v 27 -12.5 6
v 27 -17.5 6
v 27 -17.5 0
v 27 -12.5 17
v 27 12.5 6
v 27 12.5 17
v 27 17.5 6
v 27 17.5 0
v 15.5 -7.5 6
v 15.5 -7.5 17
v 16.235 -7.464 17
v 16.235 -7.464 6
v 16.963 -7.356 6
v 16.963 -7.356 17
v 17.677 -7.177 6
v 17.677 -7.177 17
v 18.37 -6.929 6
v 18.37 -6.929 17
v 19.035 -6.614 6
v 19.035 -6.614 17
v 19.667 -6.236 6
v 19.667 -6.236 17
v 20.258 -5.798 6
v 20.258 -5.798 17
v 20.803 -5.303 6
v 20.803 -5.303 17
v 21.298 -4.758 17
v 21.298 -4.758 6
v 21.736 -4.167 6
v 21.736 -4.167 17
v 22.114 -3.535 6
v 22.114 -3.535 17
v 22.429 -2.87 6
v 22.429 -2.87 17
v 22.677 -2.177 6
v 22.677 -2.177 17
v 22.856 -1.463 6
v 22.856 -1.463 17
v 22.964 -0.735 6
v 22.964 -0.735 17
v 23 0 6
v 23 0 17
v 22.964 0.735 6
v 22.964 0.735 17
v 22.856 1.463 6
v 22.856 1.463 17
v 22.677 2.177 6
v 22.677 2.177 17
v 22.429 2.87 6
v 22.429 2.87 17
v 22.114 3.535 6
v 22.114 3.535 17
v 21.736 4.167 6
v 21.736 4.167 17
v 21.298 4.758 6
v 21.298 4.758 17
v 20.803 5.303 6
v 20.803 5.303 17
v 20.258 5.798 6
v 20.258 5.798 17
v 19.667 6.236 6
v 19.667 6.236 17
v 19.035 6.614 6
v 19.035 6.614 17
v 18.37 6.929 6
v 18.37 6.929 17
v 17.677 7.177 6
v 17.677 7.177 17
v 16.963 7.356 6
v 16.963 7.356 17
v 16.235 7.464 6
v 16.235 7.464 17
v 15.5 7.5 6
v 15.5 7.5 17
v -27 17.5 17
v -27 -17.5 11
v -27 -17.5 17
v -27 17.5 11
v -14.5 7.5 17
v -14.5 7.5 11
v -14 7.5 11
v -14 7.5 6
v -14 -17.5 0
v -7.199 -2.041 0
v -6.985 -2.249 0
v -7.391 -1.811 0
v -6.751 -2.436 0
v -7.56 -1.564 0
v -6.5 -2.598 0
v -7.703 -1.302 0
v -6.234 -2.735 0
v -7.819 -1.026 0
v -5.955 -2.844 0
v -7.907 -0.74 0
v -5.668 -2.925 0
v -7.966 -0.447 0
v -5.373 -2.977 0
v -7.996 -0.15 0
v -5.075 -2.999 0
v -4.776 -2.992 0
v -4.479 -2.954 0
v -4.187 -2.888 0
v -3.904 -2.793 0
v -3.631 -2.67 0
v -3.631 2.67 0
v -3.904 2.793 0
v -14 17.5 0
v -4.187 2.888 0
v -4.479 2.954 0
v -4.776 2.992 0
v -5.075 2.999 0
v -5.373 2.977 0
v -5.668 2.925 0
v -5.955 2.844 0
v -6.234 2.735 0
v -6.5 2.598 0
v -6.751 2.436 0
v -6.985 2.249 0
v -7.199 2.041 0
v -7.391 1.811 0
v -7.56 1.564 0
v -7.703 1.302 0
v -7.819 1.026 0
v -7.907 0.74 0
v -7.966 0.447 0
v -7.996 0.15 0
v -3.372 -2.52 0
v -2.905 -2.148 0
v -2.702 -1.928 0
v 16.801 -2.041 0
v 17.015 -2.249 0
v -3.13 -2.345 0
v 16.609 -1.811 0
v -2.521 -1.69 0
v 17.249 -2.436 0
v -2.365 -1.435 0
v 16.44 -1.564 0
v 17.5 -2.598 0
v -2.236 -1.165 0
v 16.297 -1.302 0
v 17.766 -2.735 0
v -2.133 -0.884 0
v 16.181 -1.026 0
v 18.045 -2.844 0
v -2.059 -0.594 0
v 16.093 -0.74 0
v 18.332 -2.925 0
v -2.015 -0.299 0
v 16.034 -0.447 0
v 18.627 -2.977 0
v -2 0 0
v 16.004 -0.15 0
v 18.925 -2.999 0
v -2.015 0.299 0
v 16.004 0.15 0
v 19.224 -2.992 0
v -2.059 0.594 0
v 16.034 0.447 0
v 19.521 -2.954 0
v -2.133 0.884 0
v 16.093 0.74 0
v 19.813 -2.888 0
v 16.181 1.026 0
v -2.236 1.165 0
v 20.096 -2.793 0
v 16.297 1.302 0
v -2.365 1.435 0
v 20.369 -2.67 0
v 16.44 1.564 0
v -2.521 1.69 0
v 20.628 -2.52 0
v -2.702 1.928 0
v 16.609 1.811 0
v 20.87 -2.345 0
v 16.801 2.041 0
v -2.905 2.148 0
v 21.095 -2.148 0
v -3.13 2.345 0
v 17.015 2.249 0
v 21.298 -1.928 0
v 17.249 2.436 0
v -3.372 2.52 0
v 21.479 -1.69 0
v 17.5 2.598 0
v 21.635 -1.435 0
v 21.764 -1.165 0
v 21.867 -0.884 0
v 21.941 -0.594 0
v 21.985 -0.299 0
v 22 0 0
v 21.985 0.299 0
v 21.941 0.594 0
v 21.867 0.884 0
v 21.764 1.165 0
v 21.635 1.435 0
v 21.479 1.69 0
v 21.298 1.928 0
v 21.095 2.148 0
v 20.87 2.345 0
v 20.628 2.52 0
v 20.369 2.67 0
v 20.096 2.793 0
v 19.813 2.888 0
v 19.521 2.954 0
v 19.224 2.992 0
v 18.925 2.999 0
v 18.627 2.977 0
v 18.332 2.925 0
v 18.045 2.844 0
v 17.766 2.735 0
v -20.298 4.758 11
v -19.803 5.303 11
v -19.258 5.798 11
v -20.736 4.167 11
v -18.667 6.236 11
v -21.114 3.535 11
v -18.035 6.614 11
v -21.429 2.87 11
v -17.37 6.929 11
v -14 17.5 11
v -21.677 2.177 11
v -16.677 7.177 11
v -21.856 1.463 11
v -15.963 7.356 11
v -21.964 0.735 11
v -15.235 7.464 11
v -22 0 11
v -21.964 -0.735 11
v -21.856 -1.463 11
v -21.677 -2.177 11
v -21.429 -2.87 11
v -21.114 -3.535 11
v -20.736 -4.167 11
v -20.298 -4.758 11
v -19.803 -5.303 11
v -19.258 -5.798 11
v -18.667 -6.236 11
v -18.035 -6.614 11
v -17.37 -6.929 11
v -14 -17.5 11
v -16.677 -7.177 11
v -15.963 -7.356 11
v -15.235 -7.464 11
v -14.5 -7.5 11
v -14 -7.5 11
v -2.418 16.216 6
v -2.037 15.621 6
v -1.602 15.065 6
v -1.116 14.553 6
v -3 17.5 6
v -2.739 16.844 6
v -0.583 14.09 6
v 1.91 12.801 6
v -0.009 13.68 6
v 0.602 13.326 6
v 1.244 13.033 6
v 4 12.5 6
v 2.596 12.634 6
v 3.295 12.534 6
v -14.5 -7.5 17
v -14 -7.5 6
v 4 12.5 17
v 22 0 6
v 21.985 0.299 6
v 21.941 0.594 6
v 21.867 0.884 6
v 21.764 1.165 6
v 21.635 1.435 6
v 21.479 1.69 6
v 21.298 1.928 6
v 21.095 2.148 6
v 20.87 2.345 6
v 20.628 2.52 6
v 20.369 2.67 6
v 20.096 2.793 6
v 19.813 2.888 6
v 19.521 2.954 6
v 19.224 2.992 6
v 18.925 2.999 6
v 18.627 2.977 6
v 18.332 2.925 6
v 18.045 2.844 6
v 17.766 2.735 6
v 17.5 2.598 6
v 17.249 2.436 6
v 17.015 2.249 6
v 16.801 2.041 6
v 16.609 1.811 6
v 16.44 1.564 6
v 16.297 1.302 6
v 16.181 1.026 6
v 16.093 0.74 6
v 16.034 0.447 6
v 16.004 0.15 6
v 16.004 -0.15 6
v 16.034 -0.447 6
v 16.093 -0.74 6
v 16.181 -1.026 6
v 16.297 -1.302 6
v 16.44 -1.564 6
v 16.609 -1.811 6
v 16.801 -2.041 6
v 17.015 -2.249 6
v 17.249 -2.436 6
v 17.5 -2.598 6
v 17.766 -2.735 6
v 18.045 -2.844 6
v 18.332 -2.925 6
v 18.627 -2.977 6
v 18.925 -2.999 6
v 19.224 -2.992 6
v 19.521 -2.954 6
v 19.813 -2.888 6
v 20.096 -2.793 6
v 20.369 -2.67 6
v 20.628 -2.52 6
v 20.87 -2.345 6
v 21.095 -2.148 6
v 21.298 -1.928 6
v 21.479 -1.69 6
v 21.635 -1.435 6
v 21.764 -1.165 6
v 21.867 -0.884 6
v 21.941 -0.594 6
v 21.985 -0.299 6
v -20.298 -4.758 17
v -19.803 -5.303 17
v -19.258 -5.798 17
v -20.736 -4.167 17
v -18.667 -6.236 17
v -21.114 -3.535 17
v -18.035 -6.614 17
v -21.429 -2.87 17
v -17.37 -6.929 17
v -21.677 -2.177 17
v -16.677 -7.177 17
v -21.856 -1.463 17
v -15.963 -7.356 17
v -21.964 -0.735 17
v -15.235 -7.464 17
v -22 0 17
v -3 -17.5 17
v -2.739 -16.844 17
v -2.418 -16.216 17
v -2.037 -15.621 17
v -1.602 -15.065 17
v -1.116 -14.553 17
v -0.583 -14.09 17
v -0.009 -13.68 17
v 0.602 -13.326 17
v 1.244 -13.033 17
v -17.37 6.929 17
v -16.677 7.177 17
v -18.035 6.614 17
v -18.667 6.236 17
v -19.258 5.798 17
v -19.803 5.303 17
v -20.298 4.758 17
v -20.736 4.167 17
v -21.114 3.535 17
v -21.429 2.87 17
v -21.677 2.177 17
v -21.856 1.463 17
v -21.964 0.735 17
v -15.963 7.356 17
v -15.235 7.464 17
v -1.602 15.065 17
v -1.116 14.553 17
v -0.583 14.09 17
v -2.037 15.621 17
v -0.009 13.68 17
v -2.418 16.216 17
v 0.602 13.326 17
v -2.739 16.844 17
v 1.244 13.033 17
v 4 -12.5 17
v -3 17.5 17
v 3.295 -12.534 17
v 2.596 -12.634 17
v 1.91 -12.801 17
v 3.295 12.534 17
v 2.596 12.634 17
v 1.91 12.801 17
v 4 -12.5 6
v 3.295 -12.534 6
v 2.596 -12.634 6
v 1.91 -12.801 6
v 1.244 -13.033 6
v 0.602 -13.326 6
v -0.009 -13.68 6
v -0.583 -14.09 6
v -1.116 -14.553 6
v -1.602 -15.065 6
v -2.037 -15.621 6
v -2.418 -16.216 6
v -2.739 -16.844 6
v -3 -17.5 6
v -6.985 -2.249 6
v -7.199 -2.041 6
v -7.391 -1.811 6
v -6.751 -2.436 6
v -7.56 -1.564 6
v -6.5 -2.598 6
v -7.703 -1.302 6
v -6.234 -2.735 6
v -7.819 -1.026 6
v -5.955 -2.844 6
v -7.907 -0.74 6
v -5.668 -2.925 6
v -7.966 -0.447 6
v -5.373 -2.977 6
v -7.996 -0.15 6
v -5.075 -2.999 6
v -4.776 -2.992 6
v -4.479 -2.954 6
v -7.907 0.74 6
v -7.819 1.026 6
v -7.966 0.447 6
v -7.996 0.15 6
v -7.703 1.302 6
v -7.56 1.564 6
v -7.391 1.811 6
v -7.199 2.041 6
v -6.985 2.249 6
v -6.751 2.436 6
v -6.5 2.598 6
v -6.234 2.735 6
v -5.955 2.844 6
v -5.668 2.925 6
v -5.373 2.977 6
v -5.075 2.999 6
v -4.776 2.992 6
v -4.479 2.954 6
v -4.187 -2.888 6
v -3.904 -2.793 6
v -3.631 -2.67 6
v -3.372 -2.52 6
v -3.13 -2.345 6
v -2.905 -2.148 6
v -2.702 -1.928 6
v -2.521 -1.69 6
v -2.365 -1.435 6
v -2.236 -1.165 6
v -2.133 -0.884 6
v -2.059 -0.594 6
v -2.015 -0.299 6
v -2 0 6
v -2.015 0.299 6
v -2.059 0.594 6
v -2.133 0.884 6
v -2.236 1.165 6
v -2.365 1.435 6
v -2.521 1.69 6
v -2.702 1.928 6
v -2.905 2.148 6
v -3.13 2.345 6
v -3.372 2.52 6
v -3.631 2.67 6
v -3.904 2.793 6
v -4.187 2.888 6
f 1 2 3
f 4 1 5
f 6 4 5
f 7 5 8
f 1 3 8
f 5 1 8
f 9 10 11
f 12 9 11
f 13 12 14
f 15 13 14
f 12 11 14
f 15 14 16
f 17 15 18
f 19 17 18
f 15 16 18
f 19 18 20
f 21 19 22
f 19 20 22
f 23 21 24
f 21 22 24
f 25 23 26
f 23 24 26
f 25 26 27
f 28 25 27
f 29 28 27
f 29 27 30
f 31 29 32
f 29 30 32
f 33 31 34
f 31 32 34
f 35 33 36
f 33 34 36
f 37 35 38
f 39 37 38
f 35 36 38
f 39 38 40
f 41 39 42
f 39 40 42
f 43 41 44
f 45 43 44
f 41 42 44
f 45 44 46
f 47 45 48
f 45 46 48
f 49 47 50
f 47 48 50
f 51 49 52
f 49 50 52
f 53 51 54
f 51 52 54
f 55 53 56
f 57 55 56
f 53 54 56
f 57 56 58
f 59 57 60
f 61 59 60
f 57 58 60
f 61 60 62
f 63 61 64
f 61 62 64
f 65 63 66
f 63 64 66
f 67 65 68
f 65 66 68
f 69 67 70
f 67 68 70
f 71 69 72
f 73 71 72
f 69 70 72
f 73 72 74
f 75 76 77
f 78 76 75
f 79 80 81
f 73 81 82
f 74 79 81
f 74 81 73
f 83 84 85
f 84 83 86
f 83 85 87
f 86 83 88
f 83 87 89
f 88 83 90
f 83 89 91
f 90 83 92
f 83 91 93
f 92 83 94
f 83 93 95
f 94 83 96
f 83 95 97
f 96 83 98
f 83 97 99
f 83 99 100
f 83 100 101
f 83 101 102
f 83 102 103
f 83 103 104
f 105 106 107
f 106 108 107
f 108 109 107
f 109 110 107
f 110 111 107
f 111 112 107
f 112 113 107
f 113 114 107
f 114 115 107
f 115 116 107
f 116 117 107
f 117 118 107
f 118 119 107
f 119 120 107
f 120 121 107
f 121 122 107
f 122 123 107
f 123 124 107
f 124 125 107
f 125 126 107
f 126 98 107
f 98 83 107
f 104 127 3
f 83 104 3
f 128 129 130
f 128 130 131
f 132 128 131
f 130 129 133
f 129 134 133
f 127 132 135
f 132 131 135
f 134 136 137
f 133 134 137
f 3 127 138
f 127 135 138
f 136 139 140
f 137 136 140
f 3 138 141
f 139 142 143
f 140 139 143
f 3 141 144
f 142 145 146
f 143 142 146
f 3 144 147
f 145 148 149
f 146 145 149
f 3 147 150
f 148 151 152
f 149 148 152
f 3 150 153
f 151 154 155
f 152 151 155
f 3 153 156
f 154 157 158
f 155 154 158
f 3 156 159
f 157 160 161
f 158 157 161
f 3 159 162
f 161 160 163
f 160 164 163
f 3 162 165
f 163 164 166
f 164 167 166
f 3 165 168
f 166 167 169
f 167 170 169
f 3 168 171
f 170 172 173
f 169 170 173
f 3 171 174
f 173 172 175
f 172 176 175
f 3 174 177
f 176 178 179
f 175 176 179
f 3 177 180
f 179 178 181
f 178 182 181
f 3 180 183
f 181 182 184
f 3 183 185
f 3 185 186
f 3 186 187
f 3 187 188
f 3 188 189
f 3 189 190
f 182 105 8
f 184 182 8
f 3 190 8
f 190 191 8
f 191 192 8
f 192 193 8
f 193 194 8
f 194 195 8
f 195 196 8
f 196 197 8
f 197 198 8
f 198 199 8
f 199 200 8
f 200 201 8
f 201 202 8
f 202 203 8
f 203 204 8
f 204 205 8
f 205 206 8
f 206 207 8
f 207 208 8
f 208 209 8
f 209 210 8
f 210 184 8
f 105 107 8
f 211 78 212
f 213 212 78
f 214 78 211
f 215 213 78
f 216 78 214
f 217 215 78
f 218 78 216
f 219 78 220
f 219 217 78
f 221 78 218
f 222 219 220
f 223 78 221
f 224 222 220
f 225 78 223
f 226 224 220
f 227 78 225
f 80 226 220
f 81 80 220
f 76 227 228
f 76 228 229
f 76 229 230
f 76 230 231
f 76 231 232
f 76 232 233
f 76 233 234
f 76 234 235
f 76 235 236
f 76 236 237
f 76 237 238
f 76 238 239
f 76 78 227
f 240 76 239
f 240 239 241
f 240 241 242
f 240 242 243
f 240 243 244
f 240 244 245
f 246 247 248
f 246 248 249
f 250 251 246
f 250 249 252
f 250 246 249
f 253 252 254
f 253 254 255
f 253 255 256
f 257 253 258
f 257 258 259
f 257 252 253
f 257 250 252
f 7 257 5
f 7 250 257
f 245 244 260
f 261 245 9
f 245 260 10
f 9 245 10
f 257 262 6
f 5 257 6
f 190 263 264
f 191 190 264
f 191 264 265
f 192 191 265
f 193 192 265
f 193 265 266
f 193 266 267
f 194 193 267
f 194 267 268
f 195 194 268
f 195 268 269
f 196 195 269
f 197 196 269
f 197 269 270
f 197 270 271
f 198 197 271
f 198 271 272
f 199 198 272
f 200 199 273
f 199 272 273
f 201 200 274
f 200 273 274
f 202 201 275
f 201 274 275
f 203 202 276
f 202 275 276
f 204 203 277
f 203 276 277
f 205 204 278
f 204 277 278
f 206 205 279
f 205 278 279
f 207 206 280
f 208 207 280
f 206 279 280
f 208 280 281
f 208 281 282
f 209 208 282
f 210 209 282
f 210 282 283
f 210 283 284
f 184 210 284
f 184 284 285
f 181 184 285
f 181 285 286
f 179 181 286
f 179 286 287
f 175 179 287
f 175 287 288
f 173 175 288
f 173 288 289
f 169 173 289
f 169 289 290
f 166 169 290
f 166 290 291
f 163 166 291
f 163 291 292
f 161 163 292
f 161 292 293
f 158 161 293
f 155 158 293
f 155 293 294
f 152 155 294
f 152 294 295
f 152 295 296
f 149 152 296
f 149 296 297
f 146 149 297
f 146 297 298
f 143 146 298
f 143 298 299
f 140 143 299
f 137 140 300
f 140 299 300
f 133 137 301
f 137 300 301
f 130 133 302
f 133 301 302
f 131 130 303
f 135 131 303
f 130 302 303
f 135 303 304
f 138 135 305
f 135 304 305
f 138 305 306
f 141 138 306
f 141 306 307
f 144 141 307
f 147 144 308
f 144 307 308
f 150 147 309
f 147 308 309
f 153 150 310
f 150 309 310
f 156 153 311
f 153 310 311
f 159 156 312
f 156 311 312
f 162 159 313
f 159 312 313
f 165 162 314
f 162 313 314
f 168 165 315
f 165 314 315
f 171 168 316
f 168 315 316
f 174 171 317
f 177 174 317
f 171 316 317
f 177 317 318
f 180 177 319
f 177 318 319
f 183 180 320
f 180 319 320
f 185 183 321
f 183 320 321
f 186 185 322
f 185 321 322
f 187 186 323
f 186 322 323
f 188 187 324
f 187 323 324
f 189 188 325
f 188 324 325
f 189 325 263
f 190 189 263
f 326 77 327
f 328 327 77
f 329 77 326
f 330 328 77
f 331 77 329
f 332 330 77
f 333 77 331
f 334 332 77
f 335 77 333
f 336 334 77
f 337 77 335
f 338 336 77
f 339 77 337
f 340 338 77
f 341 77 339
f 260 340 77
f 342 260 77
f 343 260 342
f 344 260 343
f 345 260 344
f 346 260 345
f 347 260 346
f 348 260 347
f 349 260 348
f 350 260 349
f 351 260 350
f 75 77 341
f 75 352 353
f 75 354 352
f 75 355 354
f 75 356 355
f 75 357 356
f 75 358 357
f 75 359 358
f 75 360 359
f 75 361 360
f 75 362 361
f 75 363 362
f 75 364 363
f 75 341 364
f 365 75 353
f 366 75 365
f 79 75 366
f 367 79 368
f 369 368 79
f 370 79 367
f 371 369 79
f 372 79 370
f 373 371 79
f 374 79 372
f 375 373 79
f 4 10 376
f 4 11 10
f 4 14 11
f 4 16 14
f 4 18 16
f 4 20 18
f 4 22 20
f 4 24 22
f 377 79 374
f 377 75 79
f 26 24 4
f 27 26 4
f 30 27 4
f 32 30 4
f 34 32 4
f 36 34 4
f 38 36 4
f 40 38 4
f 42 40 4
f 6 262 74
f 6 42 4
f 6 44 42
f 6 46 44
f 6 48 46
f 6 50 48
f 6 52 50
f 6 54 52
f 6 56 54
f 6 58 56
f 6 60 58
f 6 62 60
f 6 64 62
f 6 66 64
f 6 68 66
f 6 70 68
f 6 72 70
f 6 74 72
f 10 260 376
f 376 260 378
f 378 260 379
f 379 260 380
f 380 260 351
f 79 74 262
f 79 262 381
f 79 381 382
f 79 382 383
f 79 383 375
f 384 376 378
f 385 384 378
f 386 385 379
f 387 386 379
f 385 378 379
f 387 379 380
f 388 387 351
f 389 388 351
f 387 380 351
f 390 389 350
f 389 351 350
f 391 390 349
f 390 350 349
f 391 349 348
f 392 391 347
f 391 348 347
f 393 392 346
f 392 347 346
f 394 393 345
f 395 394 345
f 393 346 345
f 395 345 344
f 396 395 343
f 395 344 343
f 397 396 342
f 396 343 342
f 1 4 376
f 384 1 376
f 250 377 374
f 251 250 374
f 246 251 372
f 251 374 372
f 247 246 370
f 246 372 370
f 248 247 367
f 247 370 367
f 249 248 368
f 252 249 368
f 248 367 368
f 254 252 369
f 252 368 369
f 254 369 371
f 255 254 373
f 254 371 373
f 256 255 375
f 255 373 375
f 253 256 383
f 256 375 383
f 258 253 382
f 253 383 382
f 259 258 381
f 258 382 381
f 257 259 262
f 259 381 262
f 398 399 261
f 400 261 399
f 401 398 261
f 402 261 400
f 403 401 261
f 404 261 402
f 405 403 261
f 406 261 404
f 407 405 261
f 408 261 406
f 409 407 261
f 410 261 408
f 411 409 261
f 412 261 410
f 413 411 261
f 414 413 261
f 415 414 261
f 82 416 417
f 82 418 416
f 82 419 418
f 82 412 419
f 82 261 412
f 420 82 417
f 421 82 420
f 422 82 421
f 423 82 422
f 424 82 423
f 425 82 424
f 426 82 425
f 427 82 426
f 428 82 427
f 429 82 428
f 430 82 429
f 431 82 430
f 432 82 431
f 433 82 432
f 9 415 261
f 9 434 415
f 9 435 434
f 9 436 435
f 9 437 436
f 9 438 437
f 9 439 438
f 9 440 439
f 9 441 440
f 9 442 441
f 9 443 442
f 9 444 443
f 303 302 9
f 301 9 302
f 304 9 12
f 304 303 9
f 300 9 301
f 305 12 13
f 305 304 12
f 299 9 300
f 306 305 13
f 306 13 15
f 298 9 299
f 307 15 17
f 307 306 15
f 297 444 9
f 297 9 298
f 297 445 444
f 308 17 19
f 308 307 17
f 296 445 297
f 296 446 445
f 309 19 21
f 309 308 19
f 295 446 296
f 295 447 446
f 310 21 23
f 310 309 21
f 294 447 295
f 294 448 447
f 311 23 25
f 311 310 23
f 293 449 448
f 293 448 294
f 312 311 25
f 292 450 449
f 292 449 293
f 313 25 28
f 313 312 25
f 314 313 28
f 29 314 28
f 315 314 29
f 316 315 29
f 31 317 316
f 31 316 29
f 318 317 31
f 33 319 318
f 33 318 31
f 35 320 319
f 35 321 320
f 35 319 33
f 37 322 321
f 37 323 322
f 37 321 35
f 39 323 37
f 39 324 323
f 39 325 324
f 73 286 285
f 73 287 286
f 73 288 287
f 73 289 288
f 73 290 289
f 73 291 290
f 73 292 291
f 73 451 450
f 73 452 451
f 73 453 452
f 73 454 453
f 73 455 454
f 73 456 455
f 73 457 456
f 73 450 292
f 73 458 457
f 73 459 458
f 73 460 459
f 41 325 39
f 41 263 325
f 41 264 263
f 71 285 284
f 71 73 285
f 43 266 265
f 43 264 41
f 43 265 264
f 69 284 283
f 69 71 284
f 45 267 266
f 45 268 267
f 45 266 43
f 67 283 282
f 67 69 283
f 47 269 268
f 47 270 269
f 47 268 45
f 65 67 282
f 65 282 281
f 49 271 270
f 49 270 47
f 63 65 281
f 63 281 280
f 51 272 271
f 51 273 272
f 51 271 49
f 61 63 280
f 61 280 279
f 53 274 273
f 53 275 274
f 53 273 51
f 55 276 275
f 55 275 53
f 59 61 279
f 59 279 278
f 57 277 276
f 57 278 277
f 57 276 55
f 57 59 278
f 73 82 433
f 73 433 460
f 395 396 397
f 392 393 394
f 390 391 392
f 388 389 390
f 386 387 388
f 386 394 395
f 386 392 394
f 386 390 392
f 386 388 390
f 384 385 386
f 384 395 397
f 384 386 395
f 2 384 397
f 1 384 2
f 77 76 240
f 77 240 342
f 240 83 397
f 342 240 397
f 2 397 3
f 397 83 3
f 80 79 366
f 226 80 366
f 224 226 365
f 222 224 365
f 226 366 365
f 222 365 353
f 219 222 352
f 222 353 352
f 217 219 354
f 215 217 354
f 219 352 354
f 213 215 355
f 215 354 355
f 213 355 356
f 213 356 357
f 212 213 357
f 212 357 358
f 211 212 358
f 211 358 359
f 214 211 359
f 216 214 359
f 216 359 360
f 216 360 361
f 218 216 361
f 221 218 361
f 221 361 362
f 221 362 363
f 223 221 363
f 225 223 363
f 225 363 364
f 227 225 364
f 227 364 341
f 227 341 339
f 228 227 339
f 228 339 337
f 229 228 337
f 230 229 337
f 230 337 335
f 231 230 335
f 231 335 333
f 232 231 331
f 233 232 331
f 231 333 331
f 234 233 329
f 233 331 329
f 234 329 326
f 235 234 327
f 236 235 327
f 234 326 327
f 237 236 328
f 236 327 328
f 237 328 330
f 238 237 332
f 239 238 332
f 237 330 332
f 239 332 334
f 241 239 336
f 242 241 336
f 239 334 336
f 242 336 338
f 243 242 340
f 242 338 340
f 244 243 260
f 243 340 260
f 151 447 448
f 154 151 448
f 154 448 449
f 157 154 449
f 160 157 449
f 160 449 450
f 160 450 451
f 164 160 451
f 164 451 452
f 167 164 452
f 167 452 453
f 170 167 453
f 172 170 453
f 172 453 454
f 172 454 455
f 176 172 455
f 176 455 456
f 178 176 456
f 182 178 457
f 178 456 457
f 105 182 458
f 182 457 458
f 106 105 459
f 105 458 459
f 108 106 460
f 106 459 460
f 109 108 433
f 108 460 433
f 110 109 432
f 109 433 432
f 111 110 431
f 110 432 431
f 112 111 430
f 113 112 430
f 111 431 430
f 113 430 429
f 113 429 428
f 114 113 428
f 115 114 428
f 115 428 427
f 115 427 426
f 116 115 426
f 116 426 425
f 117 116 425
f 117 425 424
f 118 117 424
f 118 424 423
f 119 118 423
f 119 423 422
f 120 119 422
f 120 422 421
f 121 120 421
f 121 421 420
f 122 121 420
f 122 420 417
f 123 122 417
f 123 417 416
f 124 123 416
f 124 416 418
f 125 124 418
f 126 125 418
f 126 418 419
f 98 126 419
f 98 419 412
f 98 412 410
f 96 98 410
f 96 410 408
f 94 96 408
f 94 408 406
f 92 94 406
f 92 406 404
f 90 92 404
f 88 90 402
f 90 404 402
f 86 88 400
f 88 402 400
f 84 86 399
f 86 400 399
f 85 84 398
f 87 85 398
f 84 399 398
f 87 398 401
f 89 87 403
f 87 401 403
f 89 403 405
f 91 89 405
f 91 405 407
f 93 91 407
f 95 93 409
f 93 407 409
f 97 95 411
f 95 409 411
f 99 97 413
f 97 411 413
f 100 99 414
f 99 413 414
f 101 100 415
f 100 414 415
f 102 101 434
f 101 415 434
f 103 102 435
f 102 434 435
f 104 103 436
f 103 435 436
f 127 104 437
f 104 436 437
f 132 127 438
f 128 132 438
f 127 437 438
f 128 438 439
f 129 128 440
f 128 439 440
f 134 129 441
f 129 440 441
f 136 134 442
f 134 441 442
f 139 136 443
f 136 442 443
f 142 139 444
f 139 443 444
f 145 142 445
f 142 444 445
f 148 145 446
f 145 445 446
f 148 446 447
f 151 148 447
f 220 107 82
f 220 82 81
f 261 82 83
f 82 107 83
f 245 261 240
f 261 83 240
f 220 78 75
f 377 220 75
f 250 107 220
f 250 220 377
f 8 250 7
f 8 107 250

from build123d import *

# Parameters (mm, degrees)
F0_W     = 54
F0_H     = 35
F1_DEPTH = 17
F2_W     = 13
F2_H     = 11
F3_DEPTH = 35
F5_DEPTH = 11
F6_W     = 30
F6_H     = 15
F6_R     = 3
F7_DEPTH = 11
F8_DEPTH = 25


with BuildPart() as f1:
    # F0 (on Top) → F1 (new body)
    with BuildSketch(Plane.XY):
        Rectangle(F0_W, F0_H)
    extrude(amount=F1_DEPTH)

    # F2 (on face) → F3 (cut)
    with BuildSketch(Plane.XZ.offset(17.5)):
        with Locations((-20.5, 5.5)):
            Rectangle(F2_W, F2_H)
    extrude(amount=-F3_DEPTH, mode=Mode.SUBTRACT)

    # F4 (on face) → F5 (cut)
    with BuildSketch(Plane.XY.offset(17)):
        with BuildLine():
            Line((4, -17.5), (27, -17.5))
            Line((27, -17.5), (27, -12.5))
            Line((27, -12.5), (4, -12.5))
            ThreePointArc((4, -12.5), (-0.3011626335, -13.8783723131), (-3, -17.5))
            Line((-3, -17.5), (4, -17.5))
        make_face()
        with BuildLine():
            ThreePointArc((-3, 17.5), (-0.3011626335, 13.8783723131), (4, 12.5))
            Line((4, 12.5), (27, 12.5))
            Line((27, 12.5), (27, 17.5))
            Line((27, 17.5), (4, 17.5))
            Line((4, 17.5), (-3, 17.5))
        make_face()
    extrude(amount=-F5_DEPTH, mode=Mode.SUBTRACT)

    # F6 (on face) → F7 (cut)
    with BuildSketch(Plane.XY.offset(17)):
        with Locations((0.5, 0)):
            Rectangle(F6_W, F6_H)
        with Locations((-5, 0)):
            Circle(F6_R, mode=Mode.SUBTRACT)
        with BuildLine():
            Line((15.5, 7.5), (15.5, -7.5))
            ThreePointArc((15.5, -7.5), (23, 0), (15.5, 7.5))
        make_face()
        with Locations((19, 0)):
            Circle(F6_R, mode=Mode.SUBTRACT)
        with BuildLine():
            ThreePointArc((-14.5, 7.5), (-22, 0), (-14.5, -7.5))
            Line((-14.5, -7.5), (-14.5, 7.5))
        make_face()
    extrude(amount=-F7_DEPTH, mode=Mode.SUBTRACT)

    # F8 (cut): faces of the model
    f8_faces = [f1.faces().sort_by_distance(p)[0] for p in [
        (-5, 0, 17),
        (19, 0, 17),
    ]]
    extrude(f8_faces, amount=-F8_DEPTH, mode=Mode.SUBTRACT)


solid = f1.part
